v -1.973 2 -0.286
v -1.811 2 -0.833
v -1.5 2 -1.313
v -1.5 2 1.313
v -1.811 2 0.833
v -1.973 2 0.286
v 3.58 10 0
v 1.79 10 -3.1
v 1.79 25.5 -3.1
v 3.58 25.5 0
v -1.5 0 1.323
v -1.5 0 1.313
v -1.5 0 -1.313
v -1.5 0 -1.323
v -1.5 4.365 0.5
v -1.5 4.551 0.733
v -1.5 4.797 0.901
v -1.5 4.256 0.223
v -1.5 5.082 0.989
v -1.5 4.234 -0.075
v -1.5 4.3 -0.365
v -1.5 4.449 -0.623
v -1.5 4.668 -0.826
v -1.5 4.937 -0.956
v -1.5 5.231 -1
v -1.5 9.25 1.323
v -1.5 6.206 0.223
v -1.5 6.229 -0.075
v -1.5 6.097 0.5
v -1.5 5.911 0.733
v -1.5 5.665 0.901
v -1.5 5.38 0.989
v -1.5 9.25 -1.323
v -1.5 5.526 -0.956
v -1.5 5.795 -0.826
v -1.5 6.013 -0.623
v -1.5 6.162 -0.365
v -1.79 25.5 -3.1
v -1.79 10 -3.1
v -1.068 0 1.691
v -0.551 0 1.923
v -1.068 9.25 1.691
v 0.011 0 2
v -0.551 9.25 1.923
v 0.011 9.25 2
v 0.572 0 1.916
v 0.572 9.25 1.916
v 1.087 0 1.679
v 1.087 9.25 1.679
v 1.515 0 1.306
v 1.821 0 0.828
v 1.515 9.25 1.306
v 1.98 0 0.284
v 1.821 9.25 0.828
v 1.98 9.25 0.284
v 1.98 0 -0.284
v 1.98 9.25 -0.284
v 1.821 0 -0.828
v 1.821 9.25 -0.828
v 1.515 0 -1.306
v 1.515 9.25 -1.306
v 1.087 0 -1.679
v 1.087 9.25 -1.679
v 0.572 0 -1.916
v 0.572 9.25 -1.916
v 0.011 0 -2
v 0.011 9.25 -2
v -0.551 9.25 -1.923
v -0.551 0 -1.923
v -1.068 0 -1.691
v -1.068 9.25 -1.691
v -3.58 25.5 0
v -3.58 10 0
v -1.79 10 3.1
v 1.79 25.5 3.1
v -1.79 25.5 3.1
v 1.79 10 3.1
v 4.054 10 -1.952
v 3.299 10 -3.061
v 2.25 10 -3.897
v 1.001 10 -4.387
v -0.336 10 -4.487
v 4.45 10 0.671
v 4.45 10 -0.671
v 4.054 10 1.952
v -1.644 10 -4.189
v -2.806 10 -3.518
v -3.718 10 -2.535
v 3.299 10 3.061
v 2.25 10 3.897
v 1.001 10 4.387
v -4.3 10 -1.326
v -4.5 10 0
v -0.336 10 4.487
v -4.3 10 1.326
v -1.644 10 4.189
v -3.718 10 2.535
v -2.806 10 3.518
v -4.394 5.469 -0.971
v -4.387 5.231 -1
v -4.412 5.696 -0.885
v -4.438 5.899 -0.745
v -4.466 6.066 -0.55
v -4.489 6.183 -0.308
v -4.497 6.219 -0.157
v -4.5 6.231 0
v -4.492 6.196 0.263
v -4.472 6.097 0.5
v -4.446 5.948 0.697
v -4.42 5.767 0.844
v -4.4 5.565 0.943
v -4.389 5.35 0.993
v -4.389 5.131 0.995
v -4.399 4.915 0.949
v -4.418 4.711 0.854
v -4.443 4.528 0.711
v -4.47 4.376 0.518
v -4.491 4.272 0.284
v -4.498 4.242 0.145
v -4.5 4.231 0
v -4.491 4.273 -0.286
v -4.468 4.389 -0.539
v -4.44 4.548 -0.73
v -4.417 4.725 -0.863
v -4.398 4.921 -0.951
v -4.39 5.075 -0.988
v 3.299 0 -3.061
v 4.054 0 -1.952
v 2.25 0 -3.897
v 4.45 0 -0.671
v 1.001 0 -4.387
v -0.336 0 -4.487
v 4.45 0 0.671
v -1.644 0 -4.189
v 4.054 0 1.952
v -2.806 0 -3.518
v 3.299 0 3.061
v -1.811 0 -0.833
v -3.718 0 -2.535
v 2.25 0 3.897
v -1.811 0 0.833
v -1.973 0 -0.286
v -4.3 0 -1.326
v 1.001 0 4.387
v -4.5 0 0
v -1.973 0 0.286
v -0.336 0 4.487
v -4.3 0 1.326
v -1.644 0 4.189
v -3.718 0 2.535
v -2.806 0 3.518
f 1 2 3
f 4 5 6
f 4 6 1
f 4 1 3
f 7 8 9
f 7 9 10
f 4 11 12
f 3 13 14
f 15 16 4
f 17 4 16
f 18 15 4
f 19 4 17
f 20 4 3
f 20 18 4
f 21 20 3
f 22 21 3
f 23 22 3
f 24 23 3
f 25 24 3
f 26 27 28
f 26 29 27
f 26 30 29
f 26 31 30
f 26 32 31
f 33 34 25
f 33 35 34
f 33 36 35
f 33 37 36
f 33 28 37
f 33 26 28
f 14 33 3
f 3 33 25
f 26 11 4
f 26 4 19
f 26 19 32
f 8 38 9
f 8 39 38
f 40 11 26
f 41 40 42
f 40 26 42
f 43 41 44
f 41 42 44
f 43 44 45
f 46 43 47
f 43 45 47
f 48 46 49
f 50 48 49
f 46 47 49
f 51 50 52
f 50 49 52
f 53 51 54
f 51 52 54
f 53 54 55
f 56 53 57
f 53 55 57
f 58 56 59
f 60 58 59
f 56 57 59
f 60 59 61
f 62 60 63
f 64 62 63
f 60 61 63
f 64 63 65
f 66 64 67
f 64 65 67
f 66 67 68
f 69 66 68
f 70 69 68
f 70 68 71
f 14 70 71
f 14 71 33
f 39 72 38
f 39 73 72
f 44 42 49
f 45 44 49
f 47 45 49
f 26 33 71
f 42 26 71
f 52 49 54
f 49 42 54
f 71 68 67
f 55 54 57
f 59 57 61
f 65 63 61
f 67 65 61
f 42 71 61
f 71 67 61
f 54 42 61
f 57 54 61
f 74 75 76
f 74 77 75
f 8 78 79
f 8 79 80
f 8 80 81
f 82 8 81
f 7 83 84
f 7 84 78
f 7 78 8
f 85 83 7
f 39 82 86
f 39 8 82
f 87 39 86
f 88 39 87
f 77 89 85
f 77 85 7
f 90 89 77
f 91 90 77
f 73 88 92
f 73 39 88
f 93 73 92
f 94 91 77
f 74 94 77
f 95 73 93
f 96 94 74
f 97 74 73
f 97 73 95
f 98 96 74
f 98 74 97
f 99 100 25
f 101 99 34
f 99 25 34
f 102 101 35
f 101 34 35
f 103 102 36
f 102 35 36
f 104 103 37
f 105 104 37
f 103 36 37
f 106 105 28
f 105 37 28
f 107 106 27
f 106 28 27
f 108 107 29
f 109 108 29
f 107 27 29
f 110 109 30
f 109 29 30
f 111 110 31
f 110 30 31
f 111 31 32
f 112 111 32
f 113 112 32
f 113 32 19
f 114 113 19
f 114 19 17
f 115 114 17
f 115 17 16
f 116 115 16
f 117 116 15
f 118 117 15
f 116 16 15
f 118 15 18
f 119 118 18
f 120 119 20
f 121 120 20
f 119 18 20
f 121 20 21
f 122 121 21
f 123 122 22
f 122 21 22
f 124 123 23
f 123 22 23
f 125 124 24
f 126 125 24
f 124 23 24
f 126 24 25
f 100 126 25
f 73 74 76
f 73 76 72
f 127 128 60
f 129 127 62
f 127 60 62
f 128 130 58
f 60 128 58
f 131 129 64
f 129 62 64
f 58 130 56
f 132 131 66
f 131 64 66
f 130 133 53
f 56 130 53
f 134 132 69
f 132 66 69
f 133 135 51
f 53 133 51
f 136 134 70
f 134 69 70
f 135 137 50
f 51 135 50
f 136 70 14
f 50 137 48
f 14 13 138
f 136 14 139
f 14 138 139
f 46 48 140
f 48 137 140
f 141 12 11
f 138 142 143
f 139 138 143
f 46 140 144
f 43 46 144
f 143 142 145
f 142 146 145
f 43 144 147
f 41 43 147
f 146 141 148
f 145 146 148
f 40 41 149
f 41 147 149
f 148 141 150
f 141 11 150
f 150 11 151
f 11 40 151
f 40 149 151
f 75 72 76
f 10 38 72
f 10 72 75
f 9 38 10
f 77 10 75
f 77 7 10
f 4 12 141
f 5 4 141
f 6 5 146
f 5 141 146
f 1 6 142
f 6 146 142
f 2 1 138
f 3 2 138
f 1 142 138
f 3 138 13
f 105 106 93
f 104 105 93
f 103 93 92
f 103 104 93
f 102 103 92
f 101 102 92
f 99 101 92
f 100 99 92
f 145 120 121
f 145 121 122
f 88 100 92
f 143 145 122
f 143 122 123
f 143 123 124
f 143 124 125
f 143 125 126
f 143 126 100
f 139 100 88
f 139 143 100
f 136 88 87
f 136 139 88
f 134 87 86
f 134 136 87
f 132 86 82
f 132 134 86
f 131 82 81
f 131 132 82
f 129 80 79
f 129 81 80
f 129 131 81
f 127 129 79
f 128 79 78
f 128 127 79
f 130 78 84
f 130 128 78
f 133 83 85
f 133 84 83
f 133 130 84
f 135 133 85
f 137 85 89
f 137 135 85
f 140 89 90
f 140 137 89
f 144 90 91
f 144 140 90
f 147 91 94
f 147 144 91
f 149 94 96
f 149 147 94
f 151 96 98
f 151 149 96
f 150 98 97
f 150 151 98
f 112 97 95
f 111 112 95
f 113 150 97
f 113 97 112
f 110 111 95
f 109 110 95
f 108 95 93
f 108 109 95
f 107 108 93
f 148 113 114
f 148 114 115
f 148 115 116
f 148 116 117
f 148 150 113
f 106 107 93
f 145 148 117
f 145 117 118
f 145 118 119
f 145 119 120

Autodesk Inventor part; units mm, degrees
ref_plane "YZ Plane" through (0, 0, 0) normal (1, 0, 0) x (0, 1, 0)
ref_plane "XZ Plane" through (0, 0, 0) normal (0, 1, 0) x (-1, 0, 0)
ref_plane "XY Plane" through (0, 0, 0) normal (0, 0, 1) x (1, 0, 0)
sketch "Sketch4" plane through (0, 0, 0) normal (0, 1, 0) x (-1, 0, 0)
  circle A0 centre (0, 0) radius 4.5
  dimension "d6" = 9
extrude "Extrusion2" add sketch "Sketch4" along normal blind 10
sketch "Sketch5" plane through (0, 10, 0) normal (0, 1, 0) x (1, 0, 0)
  circle A0 centre (0, 0) radius 2
  line L0 (-1.5, -1.3229) -> (-1.5, 1.3229)
  dimension "d9" = 4
  dimension "d10" = 3.5
extrude "Extrusion3" cut sketch "Sketch5" against normal blind 10 contours A0 L0 picked at (-0.1695, 0.3101)
sketch "Sketch6" plane through (0, 0, 0) normal (0, -1, 0) x (1, 0, 0)
  circle A0 centre (0, 0) radius 1.9934
extrude "Extrusion4" cut sketch "Sketch6" against normal blind 2
sketch "Sketch7" plane through (0, 10, 0) normal (0, 1, 0) x (1, 0, 0)
  line L0 (-3.58, 0) -> (-1.79, 3.1004)
  line L1 (-1.79, 3.1004) -> (1.79, 3.1004)
  line L2 (1.79, 3.1004) -> (3.58, 0)
  line L3 (3.58, 0) -> (1.79, -3.1004)
  line L4 (1.79, -3.1004) -> (-1.79, -3.1004)
  line L5 (-1.79, -3.1004) -> (-3.58, 0)
  point P0 (0, 0)
  point P1 (0, 0)
  dimension "d15" = 7.16
extrude "Extrusion5" add sketch "Sketch7" along normal blind 15.5 and the other way blind 0.75
sketch "Sketch14" plane through (-1.5, 0, 1.3129) normal (1, 0, 0) x (0, 0, -1)
  circle A0 centre (1.3129, 5.2313) radius 1
  point P0 (1.3129, 0)
  dimension "d38" = 2
extrude "Extrusion10" cut sketch "Sketch14" against normal blind 4
sketch "Sketch9" plane through (-1.5, 0, 1.3129) normal (1, 0, 0) x (0, 0, -1)
  circle A0 centre (1.3129, 5.7735) radius 1
  point P0 (1.3129, 0)
  dimension "d21" = 2
sketch "Sketch10" plane through (-3.75, 5.7735, 0) normal (-1, 0, 0) x (0, 0, 1)
  point P0 (0, -5.7735)
  point P1 (-0.001, 0.0019)
sketch "Sketch1" plane through (0, 0, 0) normal (0, 1, 0) x (-1, 0, 0)
  circle A0 centre (0, 0) radius 12.5
  dimension "d0" = 25
  dimension "d3" = 4
  dimension "d4" = 7
  dimension "d5" = 3.5
properties part number "As JGA To Mecanum_3DPrint"
